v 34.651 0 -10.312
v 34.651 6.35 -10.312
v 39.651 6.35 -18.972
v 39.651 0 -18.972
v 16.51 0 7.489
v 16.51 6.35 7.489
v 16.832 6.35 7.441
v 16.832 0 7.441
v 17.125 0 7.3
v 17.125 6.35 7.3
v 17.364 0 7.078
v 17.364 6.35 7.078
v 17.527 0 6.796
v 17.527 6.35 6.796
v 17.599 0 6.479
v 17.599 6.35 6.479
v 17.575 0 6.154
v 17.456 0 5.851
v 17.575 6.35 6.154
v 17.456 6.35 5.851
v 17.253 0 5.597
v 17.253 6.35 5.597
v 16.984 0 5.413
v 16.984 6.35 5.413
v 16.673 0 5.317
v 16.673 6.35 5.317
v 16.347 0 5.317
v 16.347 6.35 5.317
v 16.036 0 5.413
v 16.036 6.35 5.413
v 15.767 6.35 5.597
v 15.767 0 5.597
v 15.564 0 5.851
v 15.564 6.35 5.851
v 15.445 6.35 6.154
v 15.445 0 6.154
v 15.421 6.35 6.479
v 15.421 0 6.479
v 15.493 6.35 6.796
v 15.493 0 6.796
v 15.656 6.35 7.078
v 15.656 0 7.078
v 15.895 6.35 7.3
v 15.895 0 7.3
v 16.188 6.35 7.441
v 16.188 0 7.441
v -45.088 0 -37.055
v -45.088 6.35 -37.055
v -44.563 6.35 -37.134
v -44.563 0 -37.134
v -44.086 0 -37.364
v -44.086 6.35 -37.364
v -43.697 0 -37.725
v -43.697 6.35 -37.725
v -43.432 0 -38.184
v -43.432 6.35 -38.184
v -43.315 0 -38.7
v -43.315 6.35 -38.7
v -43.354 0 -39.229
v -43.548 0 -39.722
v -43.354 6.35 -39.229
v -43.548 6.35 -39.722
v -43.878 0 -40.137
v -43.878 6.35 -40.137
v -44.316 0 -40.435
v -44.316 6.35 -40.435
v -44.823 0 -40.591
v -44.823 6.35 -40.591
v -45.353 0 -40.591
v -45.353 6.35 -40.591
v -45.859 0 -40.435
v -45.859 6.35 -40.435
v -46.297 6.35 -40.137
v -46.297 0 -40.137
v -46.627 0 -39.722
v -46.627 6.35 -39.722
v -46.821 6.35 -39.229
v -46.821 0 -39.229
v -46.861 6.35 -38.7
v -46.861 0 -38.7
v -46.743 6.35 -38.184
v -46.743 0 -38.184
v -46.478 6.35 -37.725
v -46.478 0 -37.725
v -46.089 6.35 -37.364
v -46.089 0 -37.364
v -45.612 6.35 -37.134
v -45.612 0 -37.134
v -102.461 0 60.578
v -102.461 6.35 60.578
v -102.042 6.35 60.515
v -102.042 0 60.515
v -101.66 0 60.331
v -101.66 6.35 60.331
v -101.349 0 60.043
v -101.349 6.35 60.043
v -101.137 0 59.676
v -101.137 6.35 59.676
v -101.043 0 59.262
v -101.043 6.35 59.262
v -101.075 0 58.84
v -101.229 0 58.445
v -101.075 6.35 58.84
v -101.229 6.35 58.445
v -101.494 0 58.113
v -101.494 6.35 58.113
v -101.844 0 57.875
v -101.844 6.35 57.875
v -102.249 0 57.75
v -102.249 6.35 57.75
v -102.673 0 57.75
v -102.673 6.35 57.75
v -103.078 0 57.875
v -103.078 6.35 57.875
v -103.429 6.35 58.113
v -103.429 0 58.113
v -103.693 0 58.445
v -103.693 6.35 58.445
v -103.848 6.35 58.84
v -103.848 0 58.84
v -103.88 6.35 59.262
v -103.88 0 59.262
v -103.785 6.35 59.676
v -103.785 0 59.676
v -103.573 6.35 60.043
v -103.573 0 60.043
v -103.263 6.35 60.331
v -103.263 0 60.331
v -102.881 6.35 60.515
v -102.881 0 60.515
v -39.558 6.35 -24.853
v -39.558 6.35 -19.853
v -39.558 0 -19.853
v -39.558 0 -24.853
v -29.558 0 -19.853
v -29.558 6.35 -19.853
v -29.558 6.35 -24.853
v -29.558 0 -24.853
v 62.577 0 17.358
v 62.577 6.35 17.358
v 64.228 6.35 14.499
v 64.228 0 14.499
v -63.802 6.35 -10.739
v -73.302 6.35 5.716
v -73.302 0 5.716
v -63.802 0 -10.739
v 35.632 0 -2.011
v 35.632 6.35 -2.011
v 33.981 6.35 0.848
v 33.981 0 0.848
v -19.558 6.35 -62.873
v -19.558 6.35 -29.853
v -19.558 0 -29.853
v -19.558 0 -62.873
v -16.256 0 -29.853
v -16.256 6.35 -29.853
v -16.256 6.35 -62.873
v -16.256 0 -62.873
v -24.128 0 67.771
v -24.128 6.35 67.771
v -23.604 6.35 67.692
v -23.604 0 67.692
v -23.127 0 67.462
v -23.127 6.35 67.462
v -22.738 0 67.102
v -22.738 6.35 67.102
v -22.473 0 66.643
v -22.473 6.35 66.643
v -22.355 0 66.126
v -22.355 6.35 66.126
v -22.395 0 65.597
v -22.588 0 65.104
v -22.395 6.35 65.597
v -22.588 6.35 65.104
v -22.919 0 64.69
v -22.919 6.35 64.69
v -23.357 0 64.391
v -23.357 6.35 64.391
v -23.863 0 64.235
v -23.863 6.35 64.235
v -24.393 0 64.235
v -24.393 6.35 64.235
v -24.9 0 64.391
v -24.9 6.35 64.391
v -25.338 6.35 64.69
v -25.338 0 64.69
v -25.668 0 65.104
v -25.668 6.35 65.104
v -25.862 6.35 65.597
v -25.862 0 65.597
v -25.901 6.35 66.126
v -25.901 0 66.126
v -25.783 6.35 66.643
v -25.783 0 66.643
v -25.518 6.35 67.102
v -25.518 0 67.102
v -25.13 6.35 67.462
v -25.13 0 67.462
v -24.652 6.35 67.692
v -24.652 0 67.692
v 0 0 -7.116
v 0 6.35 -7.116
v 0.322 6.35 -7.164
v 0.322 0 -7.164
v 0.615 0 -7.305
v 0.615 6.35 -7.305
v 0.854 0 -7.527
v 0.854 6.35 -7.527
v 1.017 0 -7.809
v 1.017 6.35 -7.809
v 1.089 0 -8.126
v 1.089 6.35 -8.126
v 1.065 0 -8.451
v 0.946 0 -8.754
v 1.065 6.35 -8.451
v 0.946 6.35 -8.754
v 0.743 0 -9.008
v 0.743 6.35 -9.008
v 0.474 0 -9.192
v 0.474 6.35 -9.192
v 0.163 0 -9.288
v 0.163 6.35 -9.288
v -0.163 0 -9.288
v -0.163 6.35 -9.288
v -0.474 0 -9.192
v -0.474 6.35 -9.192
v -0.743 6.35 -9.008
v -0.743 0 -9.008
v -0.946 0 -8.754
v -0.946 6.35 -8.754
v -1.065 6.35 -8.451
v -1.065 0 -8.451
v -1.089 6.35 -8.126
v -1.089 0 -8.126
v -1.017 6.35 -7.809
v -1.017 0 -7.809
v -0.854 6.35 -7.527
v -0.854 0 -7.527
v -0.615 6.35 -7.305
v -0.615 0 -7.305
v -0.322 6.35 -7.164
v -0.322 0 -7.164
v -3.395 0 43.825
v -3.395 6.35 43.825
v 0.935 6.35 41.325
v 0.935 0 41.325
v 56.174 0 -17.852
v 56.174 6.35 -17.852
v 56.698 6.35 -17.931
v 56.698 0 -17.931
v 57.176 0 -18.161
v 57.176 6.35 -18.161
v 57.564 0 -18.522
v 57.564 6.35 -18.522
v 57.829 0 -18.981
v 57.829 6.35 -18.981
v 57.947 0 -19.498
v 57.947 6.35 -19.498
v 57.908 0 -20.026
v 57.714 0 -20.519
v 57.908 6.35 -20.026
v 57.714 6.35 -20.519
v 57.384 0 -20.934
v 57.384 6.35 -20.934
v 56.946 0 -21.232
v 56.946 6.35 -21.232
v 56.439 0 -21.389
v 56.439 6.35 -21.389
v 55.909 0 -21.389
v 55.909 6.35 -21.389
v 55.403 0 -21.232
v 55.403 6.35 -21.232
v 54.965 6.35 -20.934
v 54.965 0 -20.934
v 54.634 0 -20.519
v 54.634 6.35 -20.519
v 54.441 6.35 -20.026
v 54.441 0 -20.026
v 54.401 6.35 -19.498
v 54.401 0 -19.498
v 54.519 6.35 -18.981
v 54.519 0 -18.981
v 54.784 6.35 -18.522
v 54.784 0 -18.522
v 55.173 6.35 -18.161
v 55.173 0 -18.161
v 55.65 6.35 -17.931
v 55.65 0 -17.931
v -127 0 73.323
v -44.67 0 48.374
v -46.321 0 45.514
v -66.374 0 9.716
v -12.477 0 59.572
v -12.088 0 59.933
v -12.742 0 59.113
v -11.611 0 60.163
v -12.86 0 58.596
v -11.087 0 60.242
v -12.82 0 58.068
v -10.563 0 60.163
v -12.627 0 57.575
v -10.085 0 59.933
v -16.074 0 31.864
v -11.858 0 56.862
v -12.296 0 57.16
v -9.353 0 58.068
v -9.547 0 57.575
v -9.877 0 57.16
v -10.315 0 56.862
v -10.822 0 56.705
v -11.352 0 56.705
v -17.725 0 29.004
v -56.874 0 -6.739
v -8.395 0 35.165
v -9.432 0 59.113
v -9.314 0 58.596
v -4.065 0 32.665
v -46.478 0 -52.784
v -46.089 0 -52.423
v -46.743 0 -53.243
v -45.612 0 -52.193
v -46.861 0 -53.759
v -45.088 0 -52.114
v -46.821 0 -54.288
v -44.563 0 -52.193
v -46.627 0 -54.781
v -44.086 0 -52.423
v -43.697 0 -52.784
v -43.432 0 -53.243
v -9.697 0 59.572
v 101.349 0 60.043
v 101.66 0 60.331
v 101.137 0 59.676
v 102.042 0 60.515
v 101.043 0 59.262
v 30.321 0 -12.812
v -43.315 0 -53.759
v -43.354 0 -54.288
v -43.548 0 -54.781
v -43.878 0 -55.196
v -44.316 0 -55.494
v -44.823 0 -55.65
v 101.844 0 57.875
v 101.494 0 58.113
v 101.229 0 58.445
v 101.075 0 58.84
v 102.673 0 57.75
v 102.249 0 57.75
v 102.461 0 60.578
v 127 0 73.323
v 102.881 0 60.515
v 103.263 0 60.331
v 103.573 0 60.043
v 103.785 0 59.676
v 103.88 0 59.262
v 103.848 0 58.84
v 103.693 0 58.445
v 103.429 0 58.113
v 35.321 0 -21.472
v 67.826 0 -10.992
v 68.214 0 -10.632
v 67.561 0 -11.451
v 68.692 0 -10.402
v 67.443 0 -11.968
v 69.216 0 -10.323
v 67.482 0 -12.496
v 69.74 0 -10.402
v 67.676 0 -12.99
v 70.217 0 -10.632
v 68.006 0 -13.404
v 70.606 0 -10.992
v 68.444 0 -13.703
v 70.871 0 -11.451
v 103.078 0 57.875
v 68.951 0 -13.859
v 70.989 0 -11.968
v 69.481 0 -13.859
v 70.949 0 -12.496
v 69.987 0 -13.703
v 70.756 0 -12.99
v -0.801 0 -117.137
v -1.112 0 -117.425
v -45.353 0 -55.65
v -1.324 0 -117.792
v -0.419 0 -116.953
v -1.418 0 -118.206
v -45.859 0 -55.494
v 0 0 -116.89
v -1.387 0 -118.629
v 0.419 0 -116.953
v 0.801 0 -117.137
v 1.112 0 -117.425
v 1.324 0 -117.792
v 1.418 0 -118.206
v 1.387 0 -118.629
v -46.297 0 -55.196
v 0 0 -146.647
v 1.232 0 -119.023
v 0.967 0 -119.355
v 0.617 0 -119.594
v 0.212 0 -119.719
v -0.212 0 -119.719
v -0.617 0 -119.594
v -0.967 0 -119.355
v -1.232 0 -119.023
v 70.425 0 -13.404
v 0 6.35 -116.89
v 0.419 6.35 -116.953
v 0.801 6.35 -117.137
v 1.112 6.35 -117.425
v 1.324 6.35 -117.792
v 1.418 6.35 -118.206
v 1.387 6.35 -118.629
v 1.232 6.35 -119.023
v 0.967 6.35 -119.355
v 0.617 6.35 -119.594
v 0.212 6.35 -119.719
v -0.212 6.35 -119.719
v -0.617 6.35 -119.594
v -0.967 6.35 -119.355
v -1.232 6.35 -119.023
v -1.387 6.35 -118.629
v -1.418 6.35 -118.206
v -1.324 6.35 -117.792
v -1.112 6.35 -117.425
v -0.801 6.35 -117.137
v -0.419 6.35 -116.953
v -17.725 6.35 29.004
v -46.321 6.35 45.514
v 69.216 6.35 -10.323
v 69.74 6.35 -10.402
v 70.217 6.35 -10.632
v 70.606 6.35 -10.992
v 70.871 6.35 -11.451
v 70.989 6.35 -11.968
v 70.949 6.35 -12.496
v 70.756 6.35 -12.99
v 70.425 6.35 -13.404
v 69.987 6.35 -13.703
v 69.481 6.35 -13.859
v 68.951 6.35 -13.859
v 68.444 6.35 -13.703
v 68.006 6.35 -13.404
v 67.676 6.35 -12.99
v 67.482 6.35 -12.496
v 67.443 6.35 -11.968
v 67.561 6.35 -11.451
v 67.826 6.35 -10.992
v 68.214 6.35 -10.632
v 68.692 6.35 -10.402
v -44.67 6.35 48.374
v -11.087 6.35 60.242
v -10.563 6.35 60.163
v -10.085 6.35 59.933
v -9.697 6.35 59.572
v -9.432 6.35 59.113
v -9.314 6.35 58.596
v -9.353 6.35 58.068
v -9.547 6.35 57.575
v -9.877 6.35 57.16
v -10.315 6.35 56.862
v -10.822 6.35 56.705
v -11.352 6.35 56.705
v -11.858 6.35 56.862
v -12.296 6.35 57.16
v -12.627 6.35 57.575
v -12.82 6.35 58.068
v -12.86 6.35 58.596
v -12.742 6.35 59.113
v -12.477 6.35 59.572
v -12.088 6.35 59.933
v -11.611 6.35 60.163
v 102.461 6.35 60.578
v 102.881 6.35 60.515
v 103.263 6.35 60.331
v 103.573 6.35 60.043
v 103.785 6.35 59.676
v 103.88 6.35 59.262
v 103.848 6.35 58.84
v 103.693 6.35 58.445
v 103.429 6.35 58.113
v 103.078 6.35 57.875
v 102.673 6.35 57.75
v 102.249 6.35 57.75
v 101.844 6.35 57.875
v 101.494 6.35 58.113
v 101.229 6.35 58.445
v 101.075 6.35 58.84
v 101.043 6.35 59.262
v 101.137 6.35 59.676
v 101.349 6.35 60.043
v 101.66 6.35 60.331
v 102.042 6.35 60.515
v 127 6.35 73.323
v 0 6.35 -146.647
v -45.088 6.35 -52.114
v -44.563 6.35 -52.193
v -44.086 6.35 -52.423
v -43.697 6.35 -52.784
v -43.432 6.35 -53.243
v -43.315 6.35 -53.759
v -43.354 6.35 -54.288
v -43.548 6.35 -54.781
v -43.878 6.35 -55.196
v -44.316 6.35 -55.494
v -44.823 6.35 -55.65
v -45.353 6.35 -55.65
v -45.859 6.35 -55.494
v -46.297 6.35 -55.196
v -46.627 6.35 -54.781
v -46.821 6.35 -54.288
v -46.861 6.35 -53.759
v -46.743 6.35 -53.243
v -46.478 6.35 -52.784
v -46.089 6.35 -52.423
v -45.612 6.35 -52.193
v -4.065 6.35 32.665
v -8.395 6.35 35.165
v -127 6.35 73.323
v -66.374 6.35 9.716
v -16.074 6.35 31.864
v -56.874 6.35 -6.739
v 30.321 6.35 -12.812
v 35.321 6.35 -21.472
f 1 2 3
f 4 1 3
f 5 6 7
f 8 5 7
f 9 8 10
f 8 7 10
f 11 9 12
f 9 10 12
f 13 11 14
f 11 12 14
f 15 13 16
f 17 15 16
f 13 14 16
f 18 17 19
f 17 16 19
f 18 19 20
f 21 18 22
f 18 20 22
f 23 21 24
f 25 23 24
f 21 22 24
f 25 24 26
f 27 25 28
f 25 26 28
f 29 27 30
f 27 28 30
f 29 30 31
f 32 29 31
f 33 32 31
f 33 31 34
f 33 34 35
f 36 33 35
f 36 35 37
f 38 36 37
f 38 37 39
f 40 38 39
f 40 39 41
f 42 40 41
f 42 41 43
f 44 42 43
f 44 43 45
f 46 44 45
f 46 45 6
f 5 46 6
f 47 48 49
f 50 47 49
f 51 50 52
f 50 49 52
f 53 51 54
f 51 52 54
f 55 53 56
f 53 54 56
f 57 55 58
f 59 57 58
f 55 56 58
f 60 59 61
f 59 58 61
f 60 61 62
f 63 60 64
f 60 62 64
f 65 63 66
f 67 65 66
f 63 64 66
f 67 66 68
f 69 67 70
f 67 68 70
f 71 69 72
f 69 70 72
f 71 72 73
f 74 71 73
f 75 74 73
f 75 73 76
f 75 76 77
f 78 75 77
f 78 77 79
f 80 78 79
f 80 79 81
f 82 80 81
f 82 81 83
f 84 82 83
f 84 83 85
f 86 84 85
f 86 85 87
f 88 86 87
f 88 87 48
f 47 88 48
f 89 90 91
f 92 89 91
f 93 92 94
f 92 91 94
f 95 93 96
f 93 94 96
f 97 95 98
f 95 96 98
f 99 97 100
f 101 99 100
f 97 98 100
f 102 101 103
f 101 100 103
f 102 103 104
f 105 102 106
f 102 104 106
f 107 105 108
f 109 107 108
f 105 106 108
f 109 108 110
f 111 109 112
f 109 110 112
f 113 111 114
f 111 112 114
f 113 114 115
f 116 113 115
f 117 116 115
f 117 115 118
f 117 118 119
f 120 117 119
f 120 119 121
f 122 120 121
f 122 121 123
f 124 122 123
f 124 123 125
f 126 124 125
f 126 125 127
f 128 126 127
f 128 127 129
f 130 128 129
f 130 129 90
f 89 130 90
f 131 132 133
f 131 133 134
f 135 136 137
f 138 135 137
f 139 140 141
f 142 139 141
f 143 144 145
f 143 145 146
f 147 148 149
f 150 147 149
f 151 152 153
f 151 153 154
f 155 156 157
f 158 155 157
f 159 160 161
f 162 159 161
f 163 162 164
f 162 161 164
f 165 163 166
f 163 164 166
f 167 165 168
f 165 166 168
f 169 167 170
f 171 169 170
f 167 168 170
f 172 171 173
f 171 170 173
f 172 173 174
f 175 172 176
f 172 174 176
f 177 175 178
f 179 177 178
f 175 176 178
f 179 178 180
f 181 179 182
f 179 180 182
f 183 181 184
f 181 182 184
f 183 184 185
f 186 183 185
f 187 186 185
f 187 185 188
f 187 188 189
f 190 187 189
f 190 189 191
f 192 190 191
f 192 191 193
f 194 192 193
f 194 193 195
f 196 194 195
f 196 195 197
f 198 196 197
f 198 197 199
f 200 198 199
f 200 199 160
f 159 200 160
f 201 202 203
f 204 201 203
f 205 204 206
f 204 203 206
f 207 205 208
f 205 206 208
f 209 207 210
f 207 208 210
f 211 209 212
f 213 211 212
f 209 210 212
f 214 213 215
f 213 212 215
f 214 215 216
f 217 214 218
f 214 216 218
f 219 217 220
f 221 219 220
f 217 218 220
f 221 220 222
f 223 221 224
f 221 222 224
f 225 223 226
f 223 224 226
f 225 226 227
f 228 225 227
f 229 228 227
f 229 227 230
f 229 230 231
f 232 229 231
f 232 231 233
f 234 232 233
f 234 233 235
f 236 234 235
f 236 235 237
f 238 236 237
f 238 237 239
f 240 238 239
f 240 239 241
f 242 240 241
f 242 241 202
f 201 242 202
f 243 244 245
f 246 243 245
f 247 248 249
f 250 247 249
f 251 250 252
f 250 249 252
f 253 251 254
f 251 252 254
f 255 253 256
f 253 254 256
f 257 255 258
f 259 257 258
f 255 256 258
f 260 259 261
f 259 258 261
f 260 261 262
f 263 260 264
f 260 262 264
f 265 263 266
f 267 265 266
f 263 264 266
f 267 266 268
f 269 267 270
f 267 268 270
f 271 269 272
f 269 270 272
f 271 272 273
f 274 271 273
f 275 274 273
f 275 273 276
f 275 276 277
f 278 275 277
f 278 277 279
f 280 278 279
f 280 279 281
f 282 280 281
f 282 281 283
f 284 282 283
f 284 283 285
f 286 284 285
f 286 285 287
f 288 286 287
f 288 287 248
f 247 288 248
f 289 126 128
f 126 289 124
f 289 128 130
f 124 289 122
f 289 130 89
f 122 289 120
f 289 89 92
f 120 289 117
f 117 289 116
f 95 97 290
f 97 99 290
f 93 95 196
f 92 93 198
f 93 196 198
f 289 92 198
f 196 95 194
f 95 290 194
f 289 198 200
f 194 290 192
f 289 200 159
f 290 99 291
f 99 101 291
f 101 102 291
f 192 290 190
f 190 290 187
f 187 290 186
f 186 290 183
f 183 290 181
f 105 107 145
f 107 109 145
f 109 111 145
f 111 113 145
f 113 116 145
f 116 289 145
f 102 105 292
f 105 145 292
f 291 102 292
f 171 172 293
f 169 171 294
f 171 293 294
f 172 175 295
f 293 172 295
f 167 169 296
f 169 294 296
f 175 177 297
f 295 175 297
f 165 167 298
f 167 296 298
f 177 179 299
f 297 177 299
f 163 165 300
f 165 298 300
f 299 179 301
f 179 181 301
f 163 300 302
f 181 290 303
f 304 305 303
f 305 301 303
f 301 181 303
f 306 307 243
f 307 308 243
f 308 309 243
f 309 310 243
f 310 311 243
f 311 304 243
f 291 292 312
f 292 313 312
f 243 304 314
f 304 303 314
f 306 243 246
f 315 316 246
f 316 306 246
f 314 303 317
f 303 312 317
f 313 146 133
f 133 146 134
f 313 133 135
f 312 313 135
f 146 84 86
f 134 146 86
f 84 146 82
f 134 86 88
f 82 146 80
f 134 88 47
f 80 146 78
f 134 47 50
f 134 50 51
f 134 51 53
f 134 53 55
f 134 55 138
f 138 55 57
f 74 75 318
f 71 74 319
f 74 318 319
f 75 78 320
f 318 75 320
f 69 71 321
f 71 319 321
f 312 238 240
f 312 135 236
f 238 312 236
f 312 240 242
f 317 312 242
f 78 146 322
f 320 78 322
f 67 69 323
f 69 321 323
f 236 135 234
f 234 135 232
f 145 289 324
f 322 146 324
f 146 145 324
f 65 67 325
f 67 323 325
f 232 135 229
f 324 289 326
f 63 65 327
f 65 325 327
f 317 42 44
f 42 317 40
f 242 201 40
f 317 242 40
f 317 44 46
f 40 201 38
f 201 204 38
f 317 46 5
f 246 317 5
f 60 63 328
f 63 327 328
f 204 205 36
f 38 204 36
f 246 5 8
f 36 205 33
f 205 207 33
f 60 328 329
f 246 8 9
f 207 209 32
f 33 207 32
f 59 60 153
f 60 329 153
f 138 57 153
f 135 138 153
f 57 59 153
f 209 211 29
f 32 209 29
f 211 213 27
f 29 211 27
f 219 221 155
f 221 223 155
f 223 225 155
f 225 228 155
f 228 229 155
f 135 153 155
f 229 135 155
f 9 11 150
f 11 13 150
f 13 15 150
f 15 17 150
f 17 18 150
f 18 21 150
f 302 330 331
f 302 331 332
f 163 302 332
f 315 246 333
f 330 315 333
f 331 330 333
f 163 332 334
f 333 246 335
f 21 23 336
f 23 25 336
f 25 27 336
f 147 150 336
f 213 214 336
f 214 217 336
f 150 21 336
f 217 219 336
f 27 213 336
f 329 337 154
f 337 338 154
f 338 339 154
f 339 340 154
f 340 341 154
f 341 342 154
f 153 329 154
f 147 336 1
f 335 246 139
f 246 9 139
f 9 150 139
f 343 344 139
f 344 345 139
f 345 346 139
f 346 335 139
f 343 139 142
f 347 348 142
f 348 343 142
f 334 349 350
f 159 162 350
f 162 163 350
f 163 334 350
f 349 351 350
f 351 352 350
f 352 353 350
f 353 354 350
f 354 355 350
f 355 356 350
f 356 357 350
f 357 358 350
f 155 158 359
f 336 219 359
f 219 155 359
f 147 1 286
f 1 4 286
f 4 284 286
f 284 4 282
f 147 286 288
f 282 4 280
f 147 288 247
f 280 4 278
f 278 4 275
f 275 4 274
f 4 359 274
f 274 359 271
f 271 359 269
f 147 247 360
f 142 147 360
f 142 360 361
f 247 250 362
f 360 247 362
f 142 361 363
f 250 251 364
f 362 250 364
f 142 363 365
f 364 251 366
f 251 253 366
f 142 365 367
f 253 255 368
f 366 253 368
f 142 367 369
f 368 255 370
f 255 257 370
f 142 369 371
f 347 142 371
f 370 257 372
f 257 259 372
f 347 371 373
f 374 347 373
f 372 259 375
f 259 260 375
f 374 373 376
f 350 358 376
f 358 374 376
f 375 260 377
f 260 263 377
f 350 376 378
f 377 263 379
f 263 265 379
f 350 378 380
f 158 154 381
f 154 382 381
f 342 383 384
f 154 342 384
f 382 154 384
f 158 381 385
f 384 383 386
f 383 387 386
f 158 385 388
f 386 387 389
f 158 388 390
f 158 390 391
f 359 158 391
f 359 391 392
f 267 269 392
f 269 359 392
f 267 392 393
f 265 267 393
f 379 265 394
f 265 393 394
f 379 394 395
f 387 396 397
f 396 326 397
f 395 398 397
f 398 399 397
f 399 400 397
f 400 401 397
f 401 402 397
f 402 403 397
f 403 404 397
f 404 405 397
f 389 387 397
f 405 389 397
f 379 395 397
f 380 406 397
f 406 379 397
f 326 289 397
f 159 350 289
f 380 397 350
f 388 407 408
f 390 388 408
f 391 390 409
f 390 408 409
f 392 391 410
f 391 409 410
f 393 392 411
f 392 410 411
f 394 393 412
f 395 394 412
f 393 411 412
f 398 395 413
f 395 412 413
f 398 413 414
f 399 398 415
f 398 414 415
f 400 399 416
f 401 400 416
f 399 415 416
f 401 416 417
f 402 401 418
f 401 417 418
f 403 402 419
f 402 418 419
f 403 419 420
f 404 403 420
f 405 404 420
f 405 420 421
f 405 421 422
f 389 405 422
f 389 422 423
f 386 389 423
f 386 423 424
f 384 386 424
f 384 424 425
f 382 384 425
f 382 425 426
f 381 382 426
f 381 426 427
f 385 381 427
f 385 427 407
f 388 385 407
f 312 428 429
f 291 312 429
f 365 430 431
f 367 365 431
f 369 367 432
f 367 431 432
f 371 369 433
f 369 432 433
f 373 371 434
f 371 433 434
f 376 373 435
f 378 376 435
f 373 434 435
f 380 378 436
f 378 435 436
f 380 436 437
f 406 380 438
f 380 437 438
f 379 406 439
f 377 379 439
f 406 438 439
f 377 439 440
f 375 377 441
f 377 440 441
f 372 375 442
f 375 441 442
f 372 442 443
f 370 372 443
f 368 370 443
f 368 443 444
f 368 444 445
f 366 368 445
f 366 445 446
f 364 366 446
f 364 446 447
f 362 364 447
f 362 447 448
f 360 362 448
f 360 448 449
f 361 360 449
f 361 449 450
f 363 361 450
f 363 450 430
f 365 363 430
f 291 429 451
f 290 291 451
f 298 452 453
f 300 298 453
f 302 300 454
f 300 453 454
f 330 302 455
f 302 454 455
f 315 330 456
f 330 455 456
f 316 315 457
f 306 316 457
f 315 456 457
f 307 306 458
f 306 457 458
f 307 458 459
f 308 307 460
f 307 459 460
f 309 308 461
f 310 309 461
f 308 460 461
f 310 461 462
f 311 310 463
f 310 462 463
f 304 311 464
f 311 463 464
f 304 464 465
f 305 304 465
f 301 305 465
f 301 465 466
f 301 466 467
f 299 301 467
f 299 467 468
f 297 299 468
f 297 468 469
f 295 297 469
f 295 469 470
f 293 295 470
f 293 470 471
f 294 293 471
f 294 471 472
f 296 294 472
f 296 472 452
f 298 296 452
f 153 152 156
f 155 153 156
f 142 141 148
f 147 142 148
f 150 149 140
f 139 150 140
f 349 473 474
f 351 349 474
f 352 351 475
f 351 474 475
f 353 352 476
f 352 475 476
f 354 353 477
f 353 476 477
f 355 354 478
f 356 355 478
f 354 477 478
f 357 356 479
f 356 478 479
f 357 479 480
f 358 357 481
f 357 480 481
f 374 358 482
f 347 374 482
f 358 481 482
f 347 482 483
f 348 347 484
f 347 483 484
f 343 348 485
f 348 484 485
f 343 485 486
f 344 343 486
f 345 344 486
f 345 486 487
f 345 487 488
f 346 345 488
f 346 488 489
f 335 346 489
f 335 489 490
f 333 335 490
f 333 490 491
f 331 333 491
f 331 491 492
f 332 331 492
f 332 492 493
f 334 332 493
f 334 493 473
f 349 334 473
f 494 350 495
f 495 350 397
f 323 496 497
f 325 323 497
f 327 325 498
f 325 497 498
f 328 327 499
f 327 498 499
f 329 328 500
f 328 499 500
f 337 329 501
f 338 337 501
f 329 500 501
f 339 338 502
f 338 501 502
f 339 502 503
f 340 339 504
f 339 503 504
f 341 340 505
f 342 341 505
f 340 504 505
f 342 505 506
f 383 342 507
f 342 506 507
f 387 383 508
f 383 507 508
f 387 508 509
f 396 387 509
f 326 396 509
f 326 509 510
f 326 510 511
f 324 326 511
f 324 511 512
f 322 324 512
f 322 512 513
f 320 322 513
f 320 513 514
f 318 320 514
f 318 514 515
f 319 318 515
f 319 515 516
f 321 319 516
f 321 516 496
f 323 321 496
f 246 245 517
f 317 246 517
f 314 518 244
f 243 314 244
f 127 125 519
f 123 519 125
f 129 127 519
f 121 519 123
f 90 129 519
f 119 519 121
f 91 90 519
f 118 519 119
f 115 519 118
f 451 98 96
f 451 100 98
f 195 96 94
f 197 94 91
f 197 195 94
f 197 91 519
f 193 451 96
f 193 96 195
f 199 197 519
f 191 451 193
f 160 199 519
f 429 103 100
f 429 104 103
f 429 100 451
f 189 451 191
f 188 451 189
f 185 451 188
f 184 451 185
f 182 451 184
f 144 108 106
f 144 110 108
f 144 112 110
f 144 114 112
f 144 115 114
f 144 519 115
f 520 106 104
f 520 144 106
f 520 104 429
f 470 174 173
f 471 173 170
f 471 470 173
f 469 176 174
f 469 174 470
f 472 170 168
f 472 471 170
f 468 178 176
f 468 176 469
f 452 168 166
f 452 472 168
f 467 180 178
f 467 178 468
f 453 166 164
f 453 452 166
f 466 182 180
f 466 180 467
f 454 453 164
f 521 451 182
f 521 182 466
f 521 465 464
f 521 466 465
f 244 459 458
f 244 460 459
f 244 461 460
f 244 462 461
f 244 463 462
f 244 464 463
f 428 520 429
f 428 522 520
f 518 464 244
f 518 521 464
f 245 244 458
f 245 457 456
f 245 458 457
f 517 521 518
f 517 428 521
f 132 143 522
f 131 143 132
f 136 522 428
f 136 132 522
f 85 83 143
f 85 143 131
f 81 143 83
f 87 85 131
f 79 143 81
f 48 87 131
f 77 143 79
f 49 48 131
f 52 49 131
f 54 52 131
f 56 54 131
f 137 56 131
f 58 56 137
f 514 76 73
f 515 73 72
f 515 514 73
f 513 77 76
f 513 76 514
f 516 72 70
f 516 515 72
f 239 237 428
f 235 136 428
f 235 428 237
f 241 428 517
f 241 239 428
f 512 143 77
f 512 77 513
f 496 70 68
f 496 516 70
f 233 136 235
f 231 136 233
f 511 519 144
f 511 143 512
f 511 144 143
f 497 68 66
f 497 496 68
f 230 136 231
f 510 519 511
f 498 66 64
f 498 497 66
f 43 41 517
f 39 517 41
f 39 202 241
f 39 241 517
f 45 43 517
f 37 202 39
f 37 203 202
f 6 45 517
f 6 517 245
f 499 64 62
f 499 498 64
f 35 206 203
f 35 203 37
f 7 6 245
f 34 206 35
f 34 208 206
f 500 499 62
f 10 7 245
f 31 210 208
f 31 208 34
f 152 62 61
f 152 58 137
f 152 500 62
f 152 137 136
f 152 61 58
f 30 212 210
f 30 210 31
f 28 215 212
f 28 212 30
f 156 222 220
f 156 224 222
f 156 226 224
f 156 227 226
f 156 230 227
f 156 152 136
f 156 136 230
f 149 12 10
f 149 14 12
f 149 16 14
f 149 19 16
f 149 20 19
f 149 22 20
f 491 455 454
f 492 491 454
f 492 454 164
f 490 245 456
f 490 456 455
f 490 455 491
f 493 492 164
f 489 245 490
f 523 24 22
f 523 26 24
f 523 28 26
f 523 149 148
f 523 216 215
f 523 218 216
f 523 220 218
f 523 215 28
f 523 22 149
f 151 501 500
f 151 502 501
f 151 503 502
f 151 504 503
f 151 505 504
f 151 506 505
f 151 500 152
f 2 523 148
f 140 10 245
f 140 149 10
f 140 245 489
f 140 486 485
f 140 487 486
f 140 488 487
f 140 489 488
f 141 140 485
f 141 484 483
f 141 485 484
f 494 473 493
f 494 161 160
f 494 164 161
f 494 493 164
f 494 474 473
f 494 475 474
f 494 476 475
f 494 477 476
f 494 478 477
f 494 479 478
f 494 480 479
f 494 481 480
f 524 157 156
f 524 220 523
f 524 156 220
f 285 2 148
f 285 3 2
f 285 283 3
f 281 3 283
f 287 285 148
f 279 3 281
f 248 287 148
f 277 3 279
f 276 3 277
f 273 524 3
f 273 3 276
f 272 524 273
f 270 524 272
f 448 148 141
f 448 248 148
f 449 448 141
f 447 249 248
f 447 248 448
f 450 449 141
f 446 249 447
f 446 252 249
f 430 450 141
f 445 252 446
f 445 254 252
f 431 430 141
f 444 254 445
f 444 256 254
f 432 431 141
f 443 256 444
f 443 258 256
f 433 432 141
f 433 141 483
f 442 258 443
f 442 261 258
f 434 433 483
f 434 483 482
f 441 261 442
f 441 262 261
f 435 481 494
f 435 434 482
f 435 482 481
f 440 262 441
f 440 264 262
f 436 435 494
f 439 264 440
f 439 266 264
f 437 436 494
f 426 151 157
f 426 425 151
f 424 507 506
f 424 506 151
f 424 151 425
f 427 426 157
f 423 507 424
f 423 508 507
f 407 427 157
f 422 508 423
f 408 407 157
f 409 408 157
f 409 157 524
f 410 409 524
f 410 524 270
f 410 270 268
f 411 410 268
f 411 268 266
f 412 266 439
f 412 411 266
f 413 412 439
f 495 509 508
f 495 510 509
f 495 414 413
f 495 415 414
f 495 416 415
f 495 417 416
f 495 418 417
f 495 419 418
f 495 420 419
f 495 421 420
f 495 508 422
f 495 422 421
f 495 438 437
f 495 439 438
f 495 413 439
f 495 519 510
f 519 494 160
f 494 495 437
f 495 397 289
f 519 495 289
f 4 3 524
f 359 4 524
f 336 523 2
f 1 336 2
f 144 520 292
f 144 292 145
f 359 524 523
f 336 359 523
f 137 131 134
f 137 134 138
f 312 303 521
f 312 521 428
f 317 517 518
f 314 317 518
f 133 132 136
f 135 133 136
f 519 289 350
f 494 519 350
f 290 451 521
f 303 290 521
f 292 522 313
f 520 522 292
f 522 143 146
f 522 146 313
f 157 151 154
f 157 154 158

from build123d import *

# Parameters (mm, degrees)
BOSS_EXTRUDE1_DEPTH = 6.35
SKETCH2_W           = 3.302
SKETCH2_H           = 33.02
SKETCH2_R           = 1.778
CUT_EXTRUDE1_DEPTH  = 195.099602868
SKETCH3_R           = 1.4224
SKETCH3_W           = 10
SKETCH3_H           = 5
CUT_EXTRUDE2_DEPTH  = 195.099602868
SKETCH4_R           = 1.0922
CUT_EXTRUDE3_DEPTH  = 195.099602868


with BuildPart() as part:
    # Sketch1 → Boss-Extrude1 (new body)
    with BuildSketch(Plane(origin=(0, 0, 0), x_dir=(1, 0, 0), z_dir=(0, 1, 0))):
        Polygon((0, 146.646968374), (-127, -73.323484187), (127, -73.323484187), align=None)
    extrude(amount=BOSS_EXTRUDE1_DEPTH)

    # Sketch2 → Cut-Extrude1 (cut, through all)
    with BuildSketch(Plane(origin=(0, 6.35, 0), x_dir=(1, 0, 0), z_dir=(0, 1, 0))):
        with Locations((-17.907, 46.362701567)):
            Rectangle(SKETCH2_W, SKETCH2_H)
        Polygon((-16.074197928, -31.864075631), (-17.725197928, -29.004459747), (-46.321356761, -45.514459747), (-44.670356761, -48.374075631), align=None)
        with Locations(Location((-11.086716778, -58.463540546, 0), (0, 0, 270))):
            Circle(SKETCH2_R)
        with Locations(Location((-24.128284992, -65.993093465, 0), (0, 0, 270))):
            Circle(SKETCH2_R)
        Polygon((64.228356761, -14.498625936), (35.632197928, 2.011374064), (33.981197928, -0.848241819), (62.577356761, -17.358241819), align=None)
        with Locations(Location((56.174269697, 19.630391899, 0), (0, 0, 270))):
            Circle(SKETCH2_R)
        with Locations(Location((69.215837912, 12.100838979, 0), (0, 0, 270))):
            Circle(SKETCH2_R)
        Polygon((-56.873789915, 6.738674622), (-66.373789915, -9.71580805), (-73.301993146, -5.71580805), (-63.801993146, 10.738674622), align=None)
        with Locations(Location((-45.087552919, 53.892254486, 0), (0, 0, 270))):
            Circle(SKETCH2_R)
        with Locations(Location((-45.087552919, 38.833148648, 0), (0, 0, 270))):
            Circle(SKETCH2_R)
    extrude(amount=-CUT_EXTRUDE1_DEPTH, mode=Mode.SUBTRACT)

    # Sketch3 → Cut-Extrude2 (cut, through all)
    with BuildSketch(Plane(origin=(0, 6.35, 0), x_dir=(1, 0, 0), z_dir=(0, 1, 0))):
        with Locations(Location((0, 118.312139176, 0), (0, 0, 270))):
            Circle(SKETCH3_R)
        with Locations(Location((-102.461318102, -59.156069588, 0), (0, 0, 270))):
            Circle(SKETCH3_R)
        with Locations(Location((102.461318102, -59.156069588, 0), (0, 0, 270))):
            Circle(SKETCH3_R)
        with Locations((-34.558, 22.352701567)):
            Rectangle(SKETCH3_W, SKETCH3_H)
        Polygon((0.935056109, -41.324967823), (-4.064943891, -32.664713785), (-8.395070909, -35.164713785), (-3.395070909, -43.824967823), align=None)
        Polygon((35.320943891, 21.472266256), (30.320943891, 12.812012218), (34.651070909, 10.312012218), (39.651070909, 18.972266256), align=None)
    extrude(amount=-CUT_EXTRUDE2_DEPTH, mode=Mode.SUBTRACT)

    # Sketch4 → Cut-Extrude3 (cut, through all)
    with BuildSketch(Plane(origin=(0, 6.35, 0), x_dir=(1, 0, 0), z_dir=(0, 1, 0))):
        with Locations(Location((0, 8.207705491, 0), (0, 0, 270))):
            Circle(SKETCH4_R)
        with Locations(Location((16.51, -6.397294509, 0), (0, 0, 270))):
            Circle(SKETCH4_R)
    extrude(amount=-CUT_EXTRUDE3_DEPTH, mode=Mode.SUBTRACT)


solid = part.part
